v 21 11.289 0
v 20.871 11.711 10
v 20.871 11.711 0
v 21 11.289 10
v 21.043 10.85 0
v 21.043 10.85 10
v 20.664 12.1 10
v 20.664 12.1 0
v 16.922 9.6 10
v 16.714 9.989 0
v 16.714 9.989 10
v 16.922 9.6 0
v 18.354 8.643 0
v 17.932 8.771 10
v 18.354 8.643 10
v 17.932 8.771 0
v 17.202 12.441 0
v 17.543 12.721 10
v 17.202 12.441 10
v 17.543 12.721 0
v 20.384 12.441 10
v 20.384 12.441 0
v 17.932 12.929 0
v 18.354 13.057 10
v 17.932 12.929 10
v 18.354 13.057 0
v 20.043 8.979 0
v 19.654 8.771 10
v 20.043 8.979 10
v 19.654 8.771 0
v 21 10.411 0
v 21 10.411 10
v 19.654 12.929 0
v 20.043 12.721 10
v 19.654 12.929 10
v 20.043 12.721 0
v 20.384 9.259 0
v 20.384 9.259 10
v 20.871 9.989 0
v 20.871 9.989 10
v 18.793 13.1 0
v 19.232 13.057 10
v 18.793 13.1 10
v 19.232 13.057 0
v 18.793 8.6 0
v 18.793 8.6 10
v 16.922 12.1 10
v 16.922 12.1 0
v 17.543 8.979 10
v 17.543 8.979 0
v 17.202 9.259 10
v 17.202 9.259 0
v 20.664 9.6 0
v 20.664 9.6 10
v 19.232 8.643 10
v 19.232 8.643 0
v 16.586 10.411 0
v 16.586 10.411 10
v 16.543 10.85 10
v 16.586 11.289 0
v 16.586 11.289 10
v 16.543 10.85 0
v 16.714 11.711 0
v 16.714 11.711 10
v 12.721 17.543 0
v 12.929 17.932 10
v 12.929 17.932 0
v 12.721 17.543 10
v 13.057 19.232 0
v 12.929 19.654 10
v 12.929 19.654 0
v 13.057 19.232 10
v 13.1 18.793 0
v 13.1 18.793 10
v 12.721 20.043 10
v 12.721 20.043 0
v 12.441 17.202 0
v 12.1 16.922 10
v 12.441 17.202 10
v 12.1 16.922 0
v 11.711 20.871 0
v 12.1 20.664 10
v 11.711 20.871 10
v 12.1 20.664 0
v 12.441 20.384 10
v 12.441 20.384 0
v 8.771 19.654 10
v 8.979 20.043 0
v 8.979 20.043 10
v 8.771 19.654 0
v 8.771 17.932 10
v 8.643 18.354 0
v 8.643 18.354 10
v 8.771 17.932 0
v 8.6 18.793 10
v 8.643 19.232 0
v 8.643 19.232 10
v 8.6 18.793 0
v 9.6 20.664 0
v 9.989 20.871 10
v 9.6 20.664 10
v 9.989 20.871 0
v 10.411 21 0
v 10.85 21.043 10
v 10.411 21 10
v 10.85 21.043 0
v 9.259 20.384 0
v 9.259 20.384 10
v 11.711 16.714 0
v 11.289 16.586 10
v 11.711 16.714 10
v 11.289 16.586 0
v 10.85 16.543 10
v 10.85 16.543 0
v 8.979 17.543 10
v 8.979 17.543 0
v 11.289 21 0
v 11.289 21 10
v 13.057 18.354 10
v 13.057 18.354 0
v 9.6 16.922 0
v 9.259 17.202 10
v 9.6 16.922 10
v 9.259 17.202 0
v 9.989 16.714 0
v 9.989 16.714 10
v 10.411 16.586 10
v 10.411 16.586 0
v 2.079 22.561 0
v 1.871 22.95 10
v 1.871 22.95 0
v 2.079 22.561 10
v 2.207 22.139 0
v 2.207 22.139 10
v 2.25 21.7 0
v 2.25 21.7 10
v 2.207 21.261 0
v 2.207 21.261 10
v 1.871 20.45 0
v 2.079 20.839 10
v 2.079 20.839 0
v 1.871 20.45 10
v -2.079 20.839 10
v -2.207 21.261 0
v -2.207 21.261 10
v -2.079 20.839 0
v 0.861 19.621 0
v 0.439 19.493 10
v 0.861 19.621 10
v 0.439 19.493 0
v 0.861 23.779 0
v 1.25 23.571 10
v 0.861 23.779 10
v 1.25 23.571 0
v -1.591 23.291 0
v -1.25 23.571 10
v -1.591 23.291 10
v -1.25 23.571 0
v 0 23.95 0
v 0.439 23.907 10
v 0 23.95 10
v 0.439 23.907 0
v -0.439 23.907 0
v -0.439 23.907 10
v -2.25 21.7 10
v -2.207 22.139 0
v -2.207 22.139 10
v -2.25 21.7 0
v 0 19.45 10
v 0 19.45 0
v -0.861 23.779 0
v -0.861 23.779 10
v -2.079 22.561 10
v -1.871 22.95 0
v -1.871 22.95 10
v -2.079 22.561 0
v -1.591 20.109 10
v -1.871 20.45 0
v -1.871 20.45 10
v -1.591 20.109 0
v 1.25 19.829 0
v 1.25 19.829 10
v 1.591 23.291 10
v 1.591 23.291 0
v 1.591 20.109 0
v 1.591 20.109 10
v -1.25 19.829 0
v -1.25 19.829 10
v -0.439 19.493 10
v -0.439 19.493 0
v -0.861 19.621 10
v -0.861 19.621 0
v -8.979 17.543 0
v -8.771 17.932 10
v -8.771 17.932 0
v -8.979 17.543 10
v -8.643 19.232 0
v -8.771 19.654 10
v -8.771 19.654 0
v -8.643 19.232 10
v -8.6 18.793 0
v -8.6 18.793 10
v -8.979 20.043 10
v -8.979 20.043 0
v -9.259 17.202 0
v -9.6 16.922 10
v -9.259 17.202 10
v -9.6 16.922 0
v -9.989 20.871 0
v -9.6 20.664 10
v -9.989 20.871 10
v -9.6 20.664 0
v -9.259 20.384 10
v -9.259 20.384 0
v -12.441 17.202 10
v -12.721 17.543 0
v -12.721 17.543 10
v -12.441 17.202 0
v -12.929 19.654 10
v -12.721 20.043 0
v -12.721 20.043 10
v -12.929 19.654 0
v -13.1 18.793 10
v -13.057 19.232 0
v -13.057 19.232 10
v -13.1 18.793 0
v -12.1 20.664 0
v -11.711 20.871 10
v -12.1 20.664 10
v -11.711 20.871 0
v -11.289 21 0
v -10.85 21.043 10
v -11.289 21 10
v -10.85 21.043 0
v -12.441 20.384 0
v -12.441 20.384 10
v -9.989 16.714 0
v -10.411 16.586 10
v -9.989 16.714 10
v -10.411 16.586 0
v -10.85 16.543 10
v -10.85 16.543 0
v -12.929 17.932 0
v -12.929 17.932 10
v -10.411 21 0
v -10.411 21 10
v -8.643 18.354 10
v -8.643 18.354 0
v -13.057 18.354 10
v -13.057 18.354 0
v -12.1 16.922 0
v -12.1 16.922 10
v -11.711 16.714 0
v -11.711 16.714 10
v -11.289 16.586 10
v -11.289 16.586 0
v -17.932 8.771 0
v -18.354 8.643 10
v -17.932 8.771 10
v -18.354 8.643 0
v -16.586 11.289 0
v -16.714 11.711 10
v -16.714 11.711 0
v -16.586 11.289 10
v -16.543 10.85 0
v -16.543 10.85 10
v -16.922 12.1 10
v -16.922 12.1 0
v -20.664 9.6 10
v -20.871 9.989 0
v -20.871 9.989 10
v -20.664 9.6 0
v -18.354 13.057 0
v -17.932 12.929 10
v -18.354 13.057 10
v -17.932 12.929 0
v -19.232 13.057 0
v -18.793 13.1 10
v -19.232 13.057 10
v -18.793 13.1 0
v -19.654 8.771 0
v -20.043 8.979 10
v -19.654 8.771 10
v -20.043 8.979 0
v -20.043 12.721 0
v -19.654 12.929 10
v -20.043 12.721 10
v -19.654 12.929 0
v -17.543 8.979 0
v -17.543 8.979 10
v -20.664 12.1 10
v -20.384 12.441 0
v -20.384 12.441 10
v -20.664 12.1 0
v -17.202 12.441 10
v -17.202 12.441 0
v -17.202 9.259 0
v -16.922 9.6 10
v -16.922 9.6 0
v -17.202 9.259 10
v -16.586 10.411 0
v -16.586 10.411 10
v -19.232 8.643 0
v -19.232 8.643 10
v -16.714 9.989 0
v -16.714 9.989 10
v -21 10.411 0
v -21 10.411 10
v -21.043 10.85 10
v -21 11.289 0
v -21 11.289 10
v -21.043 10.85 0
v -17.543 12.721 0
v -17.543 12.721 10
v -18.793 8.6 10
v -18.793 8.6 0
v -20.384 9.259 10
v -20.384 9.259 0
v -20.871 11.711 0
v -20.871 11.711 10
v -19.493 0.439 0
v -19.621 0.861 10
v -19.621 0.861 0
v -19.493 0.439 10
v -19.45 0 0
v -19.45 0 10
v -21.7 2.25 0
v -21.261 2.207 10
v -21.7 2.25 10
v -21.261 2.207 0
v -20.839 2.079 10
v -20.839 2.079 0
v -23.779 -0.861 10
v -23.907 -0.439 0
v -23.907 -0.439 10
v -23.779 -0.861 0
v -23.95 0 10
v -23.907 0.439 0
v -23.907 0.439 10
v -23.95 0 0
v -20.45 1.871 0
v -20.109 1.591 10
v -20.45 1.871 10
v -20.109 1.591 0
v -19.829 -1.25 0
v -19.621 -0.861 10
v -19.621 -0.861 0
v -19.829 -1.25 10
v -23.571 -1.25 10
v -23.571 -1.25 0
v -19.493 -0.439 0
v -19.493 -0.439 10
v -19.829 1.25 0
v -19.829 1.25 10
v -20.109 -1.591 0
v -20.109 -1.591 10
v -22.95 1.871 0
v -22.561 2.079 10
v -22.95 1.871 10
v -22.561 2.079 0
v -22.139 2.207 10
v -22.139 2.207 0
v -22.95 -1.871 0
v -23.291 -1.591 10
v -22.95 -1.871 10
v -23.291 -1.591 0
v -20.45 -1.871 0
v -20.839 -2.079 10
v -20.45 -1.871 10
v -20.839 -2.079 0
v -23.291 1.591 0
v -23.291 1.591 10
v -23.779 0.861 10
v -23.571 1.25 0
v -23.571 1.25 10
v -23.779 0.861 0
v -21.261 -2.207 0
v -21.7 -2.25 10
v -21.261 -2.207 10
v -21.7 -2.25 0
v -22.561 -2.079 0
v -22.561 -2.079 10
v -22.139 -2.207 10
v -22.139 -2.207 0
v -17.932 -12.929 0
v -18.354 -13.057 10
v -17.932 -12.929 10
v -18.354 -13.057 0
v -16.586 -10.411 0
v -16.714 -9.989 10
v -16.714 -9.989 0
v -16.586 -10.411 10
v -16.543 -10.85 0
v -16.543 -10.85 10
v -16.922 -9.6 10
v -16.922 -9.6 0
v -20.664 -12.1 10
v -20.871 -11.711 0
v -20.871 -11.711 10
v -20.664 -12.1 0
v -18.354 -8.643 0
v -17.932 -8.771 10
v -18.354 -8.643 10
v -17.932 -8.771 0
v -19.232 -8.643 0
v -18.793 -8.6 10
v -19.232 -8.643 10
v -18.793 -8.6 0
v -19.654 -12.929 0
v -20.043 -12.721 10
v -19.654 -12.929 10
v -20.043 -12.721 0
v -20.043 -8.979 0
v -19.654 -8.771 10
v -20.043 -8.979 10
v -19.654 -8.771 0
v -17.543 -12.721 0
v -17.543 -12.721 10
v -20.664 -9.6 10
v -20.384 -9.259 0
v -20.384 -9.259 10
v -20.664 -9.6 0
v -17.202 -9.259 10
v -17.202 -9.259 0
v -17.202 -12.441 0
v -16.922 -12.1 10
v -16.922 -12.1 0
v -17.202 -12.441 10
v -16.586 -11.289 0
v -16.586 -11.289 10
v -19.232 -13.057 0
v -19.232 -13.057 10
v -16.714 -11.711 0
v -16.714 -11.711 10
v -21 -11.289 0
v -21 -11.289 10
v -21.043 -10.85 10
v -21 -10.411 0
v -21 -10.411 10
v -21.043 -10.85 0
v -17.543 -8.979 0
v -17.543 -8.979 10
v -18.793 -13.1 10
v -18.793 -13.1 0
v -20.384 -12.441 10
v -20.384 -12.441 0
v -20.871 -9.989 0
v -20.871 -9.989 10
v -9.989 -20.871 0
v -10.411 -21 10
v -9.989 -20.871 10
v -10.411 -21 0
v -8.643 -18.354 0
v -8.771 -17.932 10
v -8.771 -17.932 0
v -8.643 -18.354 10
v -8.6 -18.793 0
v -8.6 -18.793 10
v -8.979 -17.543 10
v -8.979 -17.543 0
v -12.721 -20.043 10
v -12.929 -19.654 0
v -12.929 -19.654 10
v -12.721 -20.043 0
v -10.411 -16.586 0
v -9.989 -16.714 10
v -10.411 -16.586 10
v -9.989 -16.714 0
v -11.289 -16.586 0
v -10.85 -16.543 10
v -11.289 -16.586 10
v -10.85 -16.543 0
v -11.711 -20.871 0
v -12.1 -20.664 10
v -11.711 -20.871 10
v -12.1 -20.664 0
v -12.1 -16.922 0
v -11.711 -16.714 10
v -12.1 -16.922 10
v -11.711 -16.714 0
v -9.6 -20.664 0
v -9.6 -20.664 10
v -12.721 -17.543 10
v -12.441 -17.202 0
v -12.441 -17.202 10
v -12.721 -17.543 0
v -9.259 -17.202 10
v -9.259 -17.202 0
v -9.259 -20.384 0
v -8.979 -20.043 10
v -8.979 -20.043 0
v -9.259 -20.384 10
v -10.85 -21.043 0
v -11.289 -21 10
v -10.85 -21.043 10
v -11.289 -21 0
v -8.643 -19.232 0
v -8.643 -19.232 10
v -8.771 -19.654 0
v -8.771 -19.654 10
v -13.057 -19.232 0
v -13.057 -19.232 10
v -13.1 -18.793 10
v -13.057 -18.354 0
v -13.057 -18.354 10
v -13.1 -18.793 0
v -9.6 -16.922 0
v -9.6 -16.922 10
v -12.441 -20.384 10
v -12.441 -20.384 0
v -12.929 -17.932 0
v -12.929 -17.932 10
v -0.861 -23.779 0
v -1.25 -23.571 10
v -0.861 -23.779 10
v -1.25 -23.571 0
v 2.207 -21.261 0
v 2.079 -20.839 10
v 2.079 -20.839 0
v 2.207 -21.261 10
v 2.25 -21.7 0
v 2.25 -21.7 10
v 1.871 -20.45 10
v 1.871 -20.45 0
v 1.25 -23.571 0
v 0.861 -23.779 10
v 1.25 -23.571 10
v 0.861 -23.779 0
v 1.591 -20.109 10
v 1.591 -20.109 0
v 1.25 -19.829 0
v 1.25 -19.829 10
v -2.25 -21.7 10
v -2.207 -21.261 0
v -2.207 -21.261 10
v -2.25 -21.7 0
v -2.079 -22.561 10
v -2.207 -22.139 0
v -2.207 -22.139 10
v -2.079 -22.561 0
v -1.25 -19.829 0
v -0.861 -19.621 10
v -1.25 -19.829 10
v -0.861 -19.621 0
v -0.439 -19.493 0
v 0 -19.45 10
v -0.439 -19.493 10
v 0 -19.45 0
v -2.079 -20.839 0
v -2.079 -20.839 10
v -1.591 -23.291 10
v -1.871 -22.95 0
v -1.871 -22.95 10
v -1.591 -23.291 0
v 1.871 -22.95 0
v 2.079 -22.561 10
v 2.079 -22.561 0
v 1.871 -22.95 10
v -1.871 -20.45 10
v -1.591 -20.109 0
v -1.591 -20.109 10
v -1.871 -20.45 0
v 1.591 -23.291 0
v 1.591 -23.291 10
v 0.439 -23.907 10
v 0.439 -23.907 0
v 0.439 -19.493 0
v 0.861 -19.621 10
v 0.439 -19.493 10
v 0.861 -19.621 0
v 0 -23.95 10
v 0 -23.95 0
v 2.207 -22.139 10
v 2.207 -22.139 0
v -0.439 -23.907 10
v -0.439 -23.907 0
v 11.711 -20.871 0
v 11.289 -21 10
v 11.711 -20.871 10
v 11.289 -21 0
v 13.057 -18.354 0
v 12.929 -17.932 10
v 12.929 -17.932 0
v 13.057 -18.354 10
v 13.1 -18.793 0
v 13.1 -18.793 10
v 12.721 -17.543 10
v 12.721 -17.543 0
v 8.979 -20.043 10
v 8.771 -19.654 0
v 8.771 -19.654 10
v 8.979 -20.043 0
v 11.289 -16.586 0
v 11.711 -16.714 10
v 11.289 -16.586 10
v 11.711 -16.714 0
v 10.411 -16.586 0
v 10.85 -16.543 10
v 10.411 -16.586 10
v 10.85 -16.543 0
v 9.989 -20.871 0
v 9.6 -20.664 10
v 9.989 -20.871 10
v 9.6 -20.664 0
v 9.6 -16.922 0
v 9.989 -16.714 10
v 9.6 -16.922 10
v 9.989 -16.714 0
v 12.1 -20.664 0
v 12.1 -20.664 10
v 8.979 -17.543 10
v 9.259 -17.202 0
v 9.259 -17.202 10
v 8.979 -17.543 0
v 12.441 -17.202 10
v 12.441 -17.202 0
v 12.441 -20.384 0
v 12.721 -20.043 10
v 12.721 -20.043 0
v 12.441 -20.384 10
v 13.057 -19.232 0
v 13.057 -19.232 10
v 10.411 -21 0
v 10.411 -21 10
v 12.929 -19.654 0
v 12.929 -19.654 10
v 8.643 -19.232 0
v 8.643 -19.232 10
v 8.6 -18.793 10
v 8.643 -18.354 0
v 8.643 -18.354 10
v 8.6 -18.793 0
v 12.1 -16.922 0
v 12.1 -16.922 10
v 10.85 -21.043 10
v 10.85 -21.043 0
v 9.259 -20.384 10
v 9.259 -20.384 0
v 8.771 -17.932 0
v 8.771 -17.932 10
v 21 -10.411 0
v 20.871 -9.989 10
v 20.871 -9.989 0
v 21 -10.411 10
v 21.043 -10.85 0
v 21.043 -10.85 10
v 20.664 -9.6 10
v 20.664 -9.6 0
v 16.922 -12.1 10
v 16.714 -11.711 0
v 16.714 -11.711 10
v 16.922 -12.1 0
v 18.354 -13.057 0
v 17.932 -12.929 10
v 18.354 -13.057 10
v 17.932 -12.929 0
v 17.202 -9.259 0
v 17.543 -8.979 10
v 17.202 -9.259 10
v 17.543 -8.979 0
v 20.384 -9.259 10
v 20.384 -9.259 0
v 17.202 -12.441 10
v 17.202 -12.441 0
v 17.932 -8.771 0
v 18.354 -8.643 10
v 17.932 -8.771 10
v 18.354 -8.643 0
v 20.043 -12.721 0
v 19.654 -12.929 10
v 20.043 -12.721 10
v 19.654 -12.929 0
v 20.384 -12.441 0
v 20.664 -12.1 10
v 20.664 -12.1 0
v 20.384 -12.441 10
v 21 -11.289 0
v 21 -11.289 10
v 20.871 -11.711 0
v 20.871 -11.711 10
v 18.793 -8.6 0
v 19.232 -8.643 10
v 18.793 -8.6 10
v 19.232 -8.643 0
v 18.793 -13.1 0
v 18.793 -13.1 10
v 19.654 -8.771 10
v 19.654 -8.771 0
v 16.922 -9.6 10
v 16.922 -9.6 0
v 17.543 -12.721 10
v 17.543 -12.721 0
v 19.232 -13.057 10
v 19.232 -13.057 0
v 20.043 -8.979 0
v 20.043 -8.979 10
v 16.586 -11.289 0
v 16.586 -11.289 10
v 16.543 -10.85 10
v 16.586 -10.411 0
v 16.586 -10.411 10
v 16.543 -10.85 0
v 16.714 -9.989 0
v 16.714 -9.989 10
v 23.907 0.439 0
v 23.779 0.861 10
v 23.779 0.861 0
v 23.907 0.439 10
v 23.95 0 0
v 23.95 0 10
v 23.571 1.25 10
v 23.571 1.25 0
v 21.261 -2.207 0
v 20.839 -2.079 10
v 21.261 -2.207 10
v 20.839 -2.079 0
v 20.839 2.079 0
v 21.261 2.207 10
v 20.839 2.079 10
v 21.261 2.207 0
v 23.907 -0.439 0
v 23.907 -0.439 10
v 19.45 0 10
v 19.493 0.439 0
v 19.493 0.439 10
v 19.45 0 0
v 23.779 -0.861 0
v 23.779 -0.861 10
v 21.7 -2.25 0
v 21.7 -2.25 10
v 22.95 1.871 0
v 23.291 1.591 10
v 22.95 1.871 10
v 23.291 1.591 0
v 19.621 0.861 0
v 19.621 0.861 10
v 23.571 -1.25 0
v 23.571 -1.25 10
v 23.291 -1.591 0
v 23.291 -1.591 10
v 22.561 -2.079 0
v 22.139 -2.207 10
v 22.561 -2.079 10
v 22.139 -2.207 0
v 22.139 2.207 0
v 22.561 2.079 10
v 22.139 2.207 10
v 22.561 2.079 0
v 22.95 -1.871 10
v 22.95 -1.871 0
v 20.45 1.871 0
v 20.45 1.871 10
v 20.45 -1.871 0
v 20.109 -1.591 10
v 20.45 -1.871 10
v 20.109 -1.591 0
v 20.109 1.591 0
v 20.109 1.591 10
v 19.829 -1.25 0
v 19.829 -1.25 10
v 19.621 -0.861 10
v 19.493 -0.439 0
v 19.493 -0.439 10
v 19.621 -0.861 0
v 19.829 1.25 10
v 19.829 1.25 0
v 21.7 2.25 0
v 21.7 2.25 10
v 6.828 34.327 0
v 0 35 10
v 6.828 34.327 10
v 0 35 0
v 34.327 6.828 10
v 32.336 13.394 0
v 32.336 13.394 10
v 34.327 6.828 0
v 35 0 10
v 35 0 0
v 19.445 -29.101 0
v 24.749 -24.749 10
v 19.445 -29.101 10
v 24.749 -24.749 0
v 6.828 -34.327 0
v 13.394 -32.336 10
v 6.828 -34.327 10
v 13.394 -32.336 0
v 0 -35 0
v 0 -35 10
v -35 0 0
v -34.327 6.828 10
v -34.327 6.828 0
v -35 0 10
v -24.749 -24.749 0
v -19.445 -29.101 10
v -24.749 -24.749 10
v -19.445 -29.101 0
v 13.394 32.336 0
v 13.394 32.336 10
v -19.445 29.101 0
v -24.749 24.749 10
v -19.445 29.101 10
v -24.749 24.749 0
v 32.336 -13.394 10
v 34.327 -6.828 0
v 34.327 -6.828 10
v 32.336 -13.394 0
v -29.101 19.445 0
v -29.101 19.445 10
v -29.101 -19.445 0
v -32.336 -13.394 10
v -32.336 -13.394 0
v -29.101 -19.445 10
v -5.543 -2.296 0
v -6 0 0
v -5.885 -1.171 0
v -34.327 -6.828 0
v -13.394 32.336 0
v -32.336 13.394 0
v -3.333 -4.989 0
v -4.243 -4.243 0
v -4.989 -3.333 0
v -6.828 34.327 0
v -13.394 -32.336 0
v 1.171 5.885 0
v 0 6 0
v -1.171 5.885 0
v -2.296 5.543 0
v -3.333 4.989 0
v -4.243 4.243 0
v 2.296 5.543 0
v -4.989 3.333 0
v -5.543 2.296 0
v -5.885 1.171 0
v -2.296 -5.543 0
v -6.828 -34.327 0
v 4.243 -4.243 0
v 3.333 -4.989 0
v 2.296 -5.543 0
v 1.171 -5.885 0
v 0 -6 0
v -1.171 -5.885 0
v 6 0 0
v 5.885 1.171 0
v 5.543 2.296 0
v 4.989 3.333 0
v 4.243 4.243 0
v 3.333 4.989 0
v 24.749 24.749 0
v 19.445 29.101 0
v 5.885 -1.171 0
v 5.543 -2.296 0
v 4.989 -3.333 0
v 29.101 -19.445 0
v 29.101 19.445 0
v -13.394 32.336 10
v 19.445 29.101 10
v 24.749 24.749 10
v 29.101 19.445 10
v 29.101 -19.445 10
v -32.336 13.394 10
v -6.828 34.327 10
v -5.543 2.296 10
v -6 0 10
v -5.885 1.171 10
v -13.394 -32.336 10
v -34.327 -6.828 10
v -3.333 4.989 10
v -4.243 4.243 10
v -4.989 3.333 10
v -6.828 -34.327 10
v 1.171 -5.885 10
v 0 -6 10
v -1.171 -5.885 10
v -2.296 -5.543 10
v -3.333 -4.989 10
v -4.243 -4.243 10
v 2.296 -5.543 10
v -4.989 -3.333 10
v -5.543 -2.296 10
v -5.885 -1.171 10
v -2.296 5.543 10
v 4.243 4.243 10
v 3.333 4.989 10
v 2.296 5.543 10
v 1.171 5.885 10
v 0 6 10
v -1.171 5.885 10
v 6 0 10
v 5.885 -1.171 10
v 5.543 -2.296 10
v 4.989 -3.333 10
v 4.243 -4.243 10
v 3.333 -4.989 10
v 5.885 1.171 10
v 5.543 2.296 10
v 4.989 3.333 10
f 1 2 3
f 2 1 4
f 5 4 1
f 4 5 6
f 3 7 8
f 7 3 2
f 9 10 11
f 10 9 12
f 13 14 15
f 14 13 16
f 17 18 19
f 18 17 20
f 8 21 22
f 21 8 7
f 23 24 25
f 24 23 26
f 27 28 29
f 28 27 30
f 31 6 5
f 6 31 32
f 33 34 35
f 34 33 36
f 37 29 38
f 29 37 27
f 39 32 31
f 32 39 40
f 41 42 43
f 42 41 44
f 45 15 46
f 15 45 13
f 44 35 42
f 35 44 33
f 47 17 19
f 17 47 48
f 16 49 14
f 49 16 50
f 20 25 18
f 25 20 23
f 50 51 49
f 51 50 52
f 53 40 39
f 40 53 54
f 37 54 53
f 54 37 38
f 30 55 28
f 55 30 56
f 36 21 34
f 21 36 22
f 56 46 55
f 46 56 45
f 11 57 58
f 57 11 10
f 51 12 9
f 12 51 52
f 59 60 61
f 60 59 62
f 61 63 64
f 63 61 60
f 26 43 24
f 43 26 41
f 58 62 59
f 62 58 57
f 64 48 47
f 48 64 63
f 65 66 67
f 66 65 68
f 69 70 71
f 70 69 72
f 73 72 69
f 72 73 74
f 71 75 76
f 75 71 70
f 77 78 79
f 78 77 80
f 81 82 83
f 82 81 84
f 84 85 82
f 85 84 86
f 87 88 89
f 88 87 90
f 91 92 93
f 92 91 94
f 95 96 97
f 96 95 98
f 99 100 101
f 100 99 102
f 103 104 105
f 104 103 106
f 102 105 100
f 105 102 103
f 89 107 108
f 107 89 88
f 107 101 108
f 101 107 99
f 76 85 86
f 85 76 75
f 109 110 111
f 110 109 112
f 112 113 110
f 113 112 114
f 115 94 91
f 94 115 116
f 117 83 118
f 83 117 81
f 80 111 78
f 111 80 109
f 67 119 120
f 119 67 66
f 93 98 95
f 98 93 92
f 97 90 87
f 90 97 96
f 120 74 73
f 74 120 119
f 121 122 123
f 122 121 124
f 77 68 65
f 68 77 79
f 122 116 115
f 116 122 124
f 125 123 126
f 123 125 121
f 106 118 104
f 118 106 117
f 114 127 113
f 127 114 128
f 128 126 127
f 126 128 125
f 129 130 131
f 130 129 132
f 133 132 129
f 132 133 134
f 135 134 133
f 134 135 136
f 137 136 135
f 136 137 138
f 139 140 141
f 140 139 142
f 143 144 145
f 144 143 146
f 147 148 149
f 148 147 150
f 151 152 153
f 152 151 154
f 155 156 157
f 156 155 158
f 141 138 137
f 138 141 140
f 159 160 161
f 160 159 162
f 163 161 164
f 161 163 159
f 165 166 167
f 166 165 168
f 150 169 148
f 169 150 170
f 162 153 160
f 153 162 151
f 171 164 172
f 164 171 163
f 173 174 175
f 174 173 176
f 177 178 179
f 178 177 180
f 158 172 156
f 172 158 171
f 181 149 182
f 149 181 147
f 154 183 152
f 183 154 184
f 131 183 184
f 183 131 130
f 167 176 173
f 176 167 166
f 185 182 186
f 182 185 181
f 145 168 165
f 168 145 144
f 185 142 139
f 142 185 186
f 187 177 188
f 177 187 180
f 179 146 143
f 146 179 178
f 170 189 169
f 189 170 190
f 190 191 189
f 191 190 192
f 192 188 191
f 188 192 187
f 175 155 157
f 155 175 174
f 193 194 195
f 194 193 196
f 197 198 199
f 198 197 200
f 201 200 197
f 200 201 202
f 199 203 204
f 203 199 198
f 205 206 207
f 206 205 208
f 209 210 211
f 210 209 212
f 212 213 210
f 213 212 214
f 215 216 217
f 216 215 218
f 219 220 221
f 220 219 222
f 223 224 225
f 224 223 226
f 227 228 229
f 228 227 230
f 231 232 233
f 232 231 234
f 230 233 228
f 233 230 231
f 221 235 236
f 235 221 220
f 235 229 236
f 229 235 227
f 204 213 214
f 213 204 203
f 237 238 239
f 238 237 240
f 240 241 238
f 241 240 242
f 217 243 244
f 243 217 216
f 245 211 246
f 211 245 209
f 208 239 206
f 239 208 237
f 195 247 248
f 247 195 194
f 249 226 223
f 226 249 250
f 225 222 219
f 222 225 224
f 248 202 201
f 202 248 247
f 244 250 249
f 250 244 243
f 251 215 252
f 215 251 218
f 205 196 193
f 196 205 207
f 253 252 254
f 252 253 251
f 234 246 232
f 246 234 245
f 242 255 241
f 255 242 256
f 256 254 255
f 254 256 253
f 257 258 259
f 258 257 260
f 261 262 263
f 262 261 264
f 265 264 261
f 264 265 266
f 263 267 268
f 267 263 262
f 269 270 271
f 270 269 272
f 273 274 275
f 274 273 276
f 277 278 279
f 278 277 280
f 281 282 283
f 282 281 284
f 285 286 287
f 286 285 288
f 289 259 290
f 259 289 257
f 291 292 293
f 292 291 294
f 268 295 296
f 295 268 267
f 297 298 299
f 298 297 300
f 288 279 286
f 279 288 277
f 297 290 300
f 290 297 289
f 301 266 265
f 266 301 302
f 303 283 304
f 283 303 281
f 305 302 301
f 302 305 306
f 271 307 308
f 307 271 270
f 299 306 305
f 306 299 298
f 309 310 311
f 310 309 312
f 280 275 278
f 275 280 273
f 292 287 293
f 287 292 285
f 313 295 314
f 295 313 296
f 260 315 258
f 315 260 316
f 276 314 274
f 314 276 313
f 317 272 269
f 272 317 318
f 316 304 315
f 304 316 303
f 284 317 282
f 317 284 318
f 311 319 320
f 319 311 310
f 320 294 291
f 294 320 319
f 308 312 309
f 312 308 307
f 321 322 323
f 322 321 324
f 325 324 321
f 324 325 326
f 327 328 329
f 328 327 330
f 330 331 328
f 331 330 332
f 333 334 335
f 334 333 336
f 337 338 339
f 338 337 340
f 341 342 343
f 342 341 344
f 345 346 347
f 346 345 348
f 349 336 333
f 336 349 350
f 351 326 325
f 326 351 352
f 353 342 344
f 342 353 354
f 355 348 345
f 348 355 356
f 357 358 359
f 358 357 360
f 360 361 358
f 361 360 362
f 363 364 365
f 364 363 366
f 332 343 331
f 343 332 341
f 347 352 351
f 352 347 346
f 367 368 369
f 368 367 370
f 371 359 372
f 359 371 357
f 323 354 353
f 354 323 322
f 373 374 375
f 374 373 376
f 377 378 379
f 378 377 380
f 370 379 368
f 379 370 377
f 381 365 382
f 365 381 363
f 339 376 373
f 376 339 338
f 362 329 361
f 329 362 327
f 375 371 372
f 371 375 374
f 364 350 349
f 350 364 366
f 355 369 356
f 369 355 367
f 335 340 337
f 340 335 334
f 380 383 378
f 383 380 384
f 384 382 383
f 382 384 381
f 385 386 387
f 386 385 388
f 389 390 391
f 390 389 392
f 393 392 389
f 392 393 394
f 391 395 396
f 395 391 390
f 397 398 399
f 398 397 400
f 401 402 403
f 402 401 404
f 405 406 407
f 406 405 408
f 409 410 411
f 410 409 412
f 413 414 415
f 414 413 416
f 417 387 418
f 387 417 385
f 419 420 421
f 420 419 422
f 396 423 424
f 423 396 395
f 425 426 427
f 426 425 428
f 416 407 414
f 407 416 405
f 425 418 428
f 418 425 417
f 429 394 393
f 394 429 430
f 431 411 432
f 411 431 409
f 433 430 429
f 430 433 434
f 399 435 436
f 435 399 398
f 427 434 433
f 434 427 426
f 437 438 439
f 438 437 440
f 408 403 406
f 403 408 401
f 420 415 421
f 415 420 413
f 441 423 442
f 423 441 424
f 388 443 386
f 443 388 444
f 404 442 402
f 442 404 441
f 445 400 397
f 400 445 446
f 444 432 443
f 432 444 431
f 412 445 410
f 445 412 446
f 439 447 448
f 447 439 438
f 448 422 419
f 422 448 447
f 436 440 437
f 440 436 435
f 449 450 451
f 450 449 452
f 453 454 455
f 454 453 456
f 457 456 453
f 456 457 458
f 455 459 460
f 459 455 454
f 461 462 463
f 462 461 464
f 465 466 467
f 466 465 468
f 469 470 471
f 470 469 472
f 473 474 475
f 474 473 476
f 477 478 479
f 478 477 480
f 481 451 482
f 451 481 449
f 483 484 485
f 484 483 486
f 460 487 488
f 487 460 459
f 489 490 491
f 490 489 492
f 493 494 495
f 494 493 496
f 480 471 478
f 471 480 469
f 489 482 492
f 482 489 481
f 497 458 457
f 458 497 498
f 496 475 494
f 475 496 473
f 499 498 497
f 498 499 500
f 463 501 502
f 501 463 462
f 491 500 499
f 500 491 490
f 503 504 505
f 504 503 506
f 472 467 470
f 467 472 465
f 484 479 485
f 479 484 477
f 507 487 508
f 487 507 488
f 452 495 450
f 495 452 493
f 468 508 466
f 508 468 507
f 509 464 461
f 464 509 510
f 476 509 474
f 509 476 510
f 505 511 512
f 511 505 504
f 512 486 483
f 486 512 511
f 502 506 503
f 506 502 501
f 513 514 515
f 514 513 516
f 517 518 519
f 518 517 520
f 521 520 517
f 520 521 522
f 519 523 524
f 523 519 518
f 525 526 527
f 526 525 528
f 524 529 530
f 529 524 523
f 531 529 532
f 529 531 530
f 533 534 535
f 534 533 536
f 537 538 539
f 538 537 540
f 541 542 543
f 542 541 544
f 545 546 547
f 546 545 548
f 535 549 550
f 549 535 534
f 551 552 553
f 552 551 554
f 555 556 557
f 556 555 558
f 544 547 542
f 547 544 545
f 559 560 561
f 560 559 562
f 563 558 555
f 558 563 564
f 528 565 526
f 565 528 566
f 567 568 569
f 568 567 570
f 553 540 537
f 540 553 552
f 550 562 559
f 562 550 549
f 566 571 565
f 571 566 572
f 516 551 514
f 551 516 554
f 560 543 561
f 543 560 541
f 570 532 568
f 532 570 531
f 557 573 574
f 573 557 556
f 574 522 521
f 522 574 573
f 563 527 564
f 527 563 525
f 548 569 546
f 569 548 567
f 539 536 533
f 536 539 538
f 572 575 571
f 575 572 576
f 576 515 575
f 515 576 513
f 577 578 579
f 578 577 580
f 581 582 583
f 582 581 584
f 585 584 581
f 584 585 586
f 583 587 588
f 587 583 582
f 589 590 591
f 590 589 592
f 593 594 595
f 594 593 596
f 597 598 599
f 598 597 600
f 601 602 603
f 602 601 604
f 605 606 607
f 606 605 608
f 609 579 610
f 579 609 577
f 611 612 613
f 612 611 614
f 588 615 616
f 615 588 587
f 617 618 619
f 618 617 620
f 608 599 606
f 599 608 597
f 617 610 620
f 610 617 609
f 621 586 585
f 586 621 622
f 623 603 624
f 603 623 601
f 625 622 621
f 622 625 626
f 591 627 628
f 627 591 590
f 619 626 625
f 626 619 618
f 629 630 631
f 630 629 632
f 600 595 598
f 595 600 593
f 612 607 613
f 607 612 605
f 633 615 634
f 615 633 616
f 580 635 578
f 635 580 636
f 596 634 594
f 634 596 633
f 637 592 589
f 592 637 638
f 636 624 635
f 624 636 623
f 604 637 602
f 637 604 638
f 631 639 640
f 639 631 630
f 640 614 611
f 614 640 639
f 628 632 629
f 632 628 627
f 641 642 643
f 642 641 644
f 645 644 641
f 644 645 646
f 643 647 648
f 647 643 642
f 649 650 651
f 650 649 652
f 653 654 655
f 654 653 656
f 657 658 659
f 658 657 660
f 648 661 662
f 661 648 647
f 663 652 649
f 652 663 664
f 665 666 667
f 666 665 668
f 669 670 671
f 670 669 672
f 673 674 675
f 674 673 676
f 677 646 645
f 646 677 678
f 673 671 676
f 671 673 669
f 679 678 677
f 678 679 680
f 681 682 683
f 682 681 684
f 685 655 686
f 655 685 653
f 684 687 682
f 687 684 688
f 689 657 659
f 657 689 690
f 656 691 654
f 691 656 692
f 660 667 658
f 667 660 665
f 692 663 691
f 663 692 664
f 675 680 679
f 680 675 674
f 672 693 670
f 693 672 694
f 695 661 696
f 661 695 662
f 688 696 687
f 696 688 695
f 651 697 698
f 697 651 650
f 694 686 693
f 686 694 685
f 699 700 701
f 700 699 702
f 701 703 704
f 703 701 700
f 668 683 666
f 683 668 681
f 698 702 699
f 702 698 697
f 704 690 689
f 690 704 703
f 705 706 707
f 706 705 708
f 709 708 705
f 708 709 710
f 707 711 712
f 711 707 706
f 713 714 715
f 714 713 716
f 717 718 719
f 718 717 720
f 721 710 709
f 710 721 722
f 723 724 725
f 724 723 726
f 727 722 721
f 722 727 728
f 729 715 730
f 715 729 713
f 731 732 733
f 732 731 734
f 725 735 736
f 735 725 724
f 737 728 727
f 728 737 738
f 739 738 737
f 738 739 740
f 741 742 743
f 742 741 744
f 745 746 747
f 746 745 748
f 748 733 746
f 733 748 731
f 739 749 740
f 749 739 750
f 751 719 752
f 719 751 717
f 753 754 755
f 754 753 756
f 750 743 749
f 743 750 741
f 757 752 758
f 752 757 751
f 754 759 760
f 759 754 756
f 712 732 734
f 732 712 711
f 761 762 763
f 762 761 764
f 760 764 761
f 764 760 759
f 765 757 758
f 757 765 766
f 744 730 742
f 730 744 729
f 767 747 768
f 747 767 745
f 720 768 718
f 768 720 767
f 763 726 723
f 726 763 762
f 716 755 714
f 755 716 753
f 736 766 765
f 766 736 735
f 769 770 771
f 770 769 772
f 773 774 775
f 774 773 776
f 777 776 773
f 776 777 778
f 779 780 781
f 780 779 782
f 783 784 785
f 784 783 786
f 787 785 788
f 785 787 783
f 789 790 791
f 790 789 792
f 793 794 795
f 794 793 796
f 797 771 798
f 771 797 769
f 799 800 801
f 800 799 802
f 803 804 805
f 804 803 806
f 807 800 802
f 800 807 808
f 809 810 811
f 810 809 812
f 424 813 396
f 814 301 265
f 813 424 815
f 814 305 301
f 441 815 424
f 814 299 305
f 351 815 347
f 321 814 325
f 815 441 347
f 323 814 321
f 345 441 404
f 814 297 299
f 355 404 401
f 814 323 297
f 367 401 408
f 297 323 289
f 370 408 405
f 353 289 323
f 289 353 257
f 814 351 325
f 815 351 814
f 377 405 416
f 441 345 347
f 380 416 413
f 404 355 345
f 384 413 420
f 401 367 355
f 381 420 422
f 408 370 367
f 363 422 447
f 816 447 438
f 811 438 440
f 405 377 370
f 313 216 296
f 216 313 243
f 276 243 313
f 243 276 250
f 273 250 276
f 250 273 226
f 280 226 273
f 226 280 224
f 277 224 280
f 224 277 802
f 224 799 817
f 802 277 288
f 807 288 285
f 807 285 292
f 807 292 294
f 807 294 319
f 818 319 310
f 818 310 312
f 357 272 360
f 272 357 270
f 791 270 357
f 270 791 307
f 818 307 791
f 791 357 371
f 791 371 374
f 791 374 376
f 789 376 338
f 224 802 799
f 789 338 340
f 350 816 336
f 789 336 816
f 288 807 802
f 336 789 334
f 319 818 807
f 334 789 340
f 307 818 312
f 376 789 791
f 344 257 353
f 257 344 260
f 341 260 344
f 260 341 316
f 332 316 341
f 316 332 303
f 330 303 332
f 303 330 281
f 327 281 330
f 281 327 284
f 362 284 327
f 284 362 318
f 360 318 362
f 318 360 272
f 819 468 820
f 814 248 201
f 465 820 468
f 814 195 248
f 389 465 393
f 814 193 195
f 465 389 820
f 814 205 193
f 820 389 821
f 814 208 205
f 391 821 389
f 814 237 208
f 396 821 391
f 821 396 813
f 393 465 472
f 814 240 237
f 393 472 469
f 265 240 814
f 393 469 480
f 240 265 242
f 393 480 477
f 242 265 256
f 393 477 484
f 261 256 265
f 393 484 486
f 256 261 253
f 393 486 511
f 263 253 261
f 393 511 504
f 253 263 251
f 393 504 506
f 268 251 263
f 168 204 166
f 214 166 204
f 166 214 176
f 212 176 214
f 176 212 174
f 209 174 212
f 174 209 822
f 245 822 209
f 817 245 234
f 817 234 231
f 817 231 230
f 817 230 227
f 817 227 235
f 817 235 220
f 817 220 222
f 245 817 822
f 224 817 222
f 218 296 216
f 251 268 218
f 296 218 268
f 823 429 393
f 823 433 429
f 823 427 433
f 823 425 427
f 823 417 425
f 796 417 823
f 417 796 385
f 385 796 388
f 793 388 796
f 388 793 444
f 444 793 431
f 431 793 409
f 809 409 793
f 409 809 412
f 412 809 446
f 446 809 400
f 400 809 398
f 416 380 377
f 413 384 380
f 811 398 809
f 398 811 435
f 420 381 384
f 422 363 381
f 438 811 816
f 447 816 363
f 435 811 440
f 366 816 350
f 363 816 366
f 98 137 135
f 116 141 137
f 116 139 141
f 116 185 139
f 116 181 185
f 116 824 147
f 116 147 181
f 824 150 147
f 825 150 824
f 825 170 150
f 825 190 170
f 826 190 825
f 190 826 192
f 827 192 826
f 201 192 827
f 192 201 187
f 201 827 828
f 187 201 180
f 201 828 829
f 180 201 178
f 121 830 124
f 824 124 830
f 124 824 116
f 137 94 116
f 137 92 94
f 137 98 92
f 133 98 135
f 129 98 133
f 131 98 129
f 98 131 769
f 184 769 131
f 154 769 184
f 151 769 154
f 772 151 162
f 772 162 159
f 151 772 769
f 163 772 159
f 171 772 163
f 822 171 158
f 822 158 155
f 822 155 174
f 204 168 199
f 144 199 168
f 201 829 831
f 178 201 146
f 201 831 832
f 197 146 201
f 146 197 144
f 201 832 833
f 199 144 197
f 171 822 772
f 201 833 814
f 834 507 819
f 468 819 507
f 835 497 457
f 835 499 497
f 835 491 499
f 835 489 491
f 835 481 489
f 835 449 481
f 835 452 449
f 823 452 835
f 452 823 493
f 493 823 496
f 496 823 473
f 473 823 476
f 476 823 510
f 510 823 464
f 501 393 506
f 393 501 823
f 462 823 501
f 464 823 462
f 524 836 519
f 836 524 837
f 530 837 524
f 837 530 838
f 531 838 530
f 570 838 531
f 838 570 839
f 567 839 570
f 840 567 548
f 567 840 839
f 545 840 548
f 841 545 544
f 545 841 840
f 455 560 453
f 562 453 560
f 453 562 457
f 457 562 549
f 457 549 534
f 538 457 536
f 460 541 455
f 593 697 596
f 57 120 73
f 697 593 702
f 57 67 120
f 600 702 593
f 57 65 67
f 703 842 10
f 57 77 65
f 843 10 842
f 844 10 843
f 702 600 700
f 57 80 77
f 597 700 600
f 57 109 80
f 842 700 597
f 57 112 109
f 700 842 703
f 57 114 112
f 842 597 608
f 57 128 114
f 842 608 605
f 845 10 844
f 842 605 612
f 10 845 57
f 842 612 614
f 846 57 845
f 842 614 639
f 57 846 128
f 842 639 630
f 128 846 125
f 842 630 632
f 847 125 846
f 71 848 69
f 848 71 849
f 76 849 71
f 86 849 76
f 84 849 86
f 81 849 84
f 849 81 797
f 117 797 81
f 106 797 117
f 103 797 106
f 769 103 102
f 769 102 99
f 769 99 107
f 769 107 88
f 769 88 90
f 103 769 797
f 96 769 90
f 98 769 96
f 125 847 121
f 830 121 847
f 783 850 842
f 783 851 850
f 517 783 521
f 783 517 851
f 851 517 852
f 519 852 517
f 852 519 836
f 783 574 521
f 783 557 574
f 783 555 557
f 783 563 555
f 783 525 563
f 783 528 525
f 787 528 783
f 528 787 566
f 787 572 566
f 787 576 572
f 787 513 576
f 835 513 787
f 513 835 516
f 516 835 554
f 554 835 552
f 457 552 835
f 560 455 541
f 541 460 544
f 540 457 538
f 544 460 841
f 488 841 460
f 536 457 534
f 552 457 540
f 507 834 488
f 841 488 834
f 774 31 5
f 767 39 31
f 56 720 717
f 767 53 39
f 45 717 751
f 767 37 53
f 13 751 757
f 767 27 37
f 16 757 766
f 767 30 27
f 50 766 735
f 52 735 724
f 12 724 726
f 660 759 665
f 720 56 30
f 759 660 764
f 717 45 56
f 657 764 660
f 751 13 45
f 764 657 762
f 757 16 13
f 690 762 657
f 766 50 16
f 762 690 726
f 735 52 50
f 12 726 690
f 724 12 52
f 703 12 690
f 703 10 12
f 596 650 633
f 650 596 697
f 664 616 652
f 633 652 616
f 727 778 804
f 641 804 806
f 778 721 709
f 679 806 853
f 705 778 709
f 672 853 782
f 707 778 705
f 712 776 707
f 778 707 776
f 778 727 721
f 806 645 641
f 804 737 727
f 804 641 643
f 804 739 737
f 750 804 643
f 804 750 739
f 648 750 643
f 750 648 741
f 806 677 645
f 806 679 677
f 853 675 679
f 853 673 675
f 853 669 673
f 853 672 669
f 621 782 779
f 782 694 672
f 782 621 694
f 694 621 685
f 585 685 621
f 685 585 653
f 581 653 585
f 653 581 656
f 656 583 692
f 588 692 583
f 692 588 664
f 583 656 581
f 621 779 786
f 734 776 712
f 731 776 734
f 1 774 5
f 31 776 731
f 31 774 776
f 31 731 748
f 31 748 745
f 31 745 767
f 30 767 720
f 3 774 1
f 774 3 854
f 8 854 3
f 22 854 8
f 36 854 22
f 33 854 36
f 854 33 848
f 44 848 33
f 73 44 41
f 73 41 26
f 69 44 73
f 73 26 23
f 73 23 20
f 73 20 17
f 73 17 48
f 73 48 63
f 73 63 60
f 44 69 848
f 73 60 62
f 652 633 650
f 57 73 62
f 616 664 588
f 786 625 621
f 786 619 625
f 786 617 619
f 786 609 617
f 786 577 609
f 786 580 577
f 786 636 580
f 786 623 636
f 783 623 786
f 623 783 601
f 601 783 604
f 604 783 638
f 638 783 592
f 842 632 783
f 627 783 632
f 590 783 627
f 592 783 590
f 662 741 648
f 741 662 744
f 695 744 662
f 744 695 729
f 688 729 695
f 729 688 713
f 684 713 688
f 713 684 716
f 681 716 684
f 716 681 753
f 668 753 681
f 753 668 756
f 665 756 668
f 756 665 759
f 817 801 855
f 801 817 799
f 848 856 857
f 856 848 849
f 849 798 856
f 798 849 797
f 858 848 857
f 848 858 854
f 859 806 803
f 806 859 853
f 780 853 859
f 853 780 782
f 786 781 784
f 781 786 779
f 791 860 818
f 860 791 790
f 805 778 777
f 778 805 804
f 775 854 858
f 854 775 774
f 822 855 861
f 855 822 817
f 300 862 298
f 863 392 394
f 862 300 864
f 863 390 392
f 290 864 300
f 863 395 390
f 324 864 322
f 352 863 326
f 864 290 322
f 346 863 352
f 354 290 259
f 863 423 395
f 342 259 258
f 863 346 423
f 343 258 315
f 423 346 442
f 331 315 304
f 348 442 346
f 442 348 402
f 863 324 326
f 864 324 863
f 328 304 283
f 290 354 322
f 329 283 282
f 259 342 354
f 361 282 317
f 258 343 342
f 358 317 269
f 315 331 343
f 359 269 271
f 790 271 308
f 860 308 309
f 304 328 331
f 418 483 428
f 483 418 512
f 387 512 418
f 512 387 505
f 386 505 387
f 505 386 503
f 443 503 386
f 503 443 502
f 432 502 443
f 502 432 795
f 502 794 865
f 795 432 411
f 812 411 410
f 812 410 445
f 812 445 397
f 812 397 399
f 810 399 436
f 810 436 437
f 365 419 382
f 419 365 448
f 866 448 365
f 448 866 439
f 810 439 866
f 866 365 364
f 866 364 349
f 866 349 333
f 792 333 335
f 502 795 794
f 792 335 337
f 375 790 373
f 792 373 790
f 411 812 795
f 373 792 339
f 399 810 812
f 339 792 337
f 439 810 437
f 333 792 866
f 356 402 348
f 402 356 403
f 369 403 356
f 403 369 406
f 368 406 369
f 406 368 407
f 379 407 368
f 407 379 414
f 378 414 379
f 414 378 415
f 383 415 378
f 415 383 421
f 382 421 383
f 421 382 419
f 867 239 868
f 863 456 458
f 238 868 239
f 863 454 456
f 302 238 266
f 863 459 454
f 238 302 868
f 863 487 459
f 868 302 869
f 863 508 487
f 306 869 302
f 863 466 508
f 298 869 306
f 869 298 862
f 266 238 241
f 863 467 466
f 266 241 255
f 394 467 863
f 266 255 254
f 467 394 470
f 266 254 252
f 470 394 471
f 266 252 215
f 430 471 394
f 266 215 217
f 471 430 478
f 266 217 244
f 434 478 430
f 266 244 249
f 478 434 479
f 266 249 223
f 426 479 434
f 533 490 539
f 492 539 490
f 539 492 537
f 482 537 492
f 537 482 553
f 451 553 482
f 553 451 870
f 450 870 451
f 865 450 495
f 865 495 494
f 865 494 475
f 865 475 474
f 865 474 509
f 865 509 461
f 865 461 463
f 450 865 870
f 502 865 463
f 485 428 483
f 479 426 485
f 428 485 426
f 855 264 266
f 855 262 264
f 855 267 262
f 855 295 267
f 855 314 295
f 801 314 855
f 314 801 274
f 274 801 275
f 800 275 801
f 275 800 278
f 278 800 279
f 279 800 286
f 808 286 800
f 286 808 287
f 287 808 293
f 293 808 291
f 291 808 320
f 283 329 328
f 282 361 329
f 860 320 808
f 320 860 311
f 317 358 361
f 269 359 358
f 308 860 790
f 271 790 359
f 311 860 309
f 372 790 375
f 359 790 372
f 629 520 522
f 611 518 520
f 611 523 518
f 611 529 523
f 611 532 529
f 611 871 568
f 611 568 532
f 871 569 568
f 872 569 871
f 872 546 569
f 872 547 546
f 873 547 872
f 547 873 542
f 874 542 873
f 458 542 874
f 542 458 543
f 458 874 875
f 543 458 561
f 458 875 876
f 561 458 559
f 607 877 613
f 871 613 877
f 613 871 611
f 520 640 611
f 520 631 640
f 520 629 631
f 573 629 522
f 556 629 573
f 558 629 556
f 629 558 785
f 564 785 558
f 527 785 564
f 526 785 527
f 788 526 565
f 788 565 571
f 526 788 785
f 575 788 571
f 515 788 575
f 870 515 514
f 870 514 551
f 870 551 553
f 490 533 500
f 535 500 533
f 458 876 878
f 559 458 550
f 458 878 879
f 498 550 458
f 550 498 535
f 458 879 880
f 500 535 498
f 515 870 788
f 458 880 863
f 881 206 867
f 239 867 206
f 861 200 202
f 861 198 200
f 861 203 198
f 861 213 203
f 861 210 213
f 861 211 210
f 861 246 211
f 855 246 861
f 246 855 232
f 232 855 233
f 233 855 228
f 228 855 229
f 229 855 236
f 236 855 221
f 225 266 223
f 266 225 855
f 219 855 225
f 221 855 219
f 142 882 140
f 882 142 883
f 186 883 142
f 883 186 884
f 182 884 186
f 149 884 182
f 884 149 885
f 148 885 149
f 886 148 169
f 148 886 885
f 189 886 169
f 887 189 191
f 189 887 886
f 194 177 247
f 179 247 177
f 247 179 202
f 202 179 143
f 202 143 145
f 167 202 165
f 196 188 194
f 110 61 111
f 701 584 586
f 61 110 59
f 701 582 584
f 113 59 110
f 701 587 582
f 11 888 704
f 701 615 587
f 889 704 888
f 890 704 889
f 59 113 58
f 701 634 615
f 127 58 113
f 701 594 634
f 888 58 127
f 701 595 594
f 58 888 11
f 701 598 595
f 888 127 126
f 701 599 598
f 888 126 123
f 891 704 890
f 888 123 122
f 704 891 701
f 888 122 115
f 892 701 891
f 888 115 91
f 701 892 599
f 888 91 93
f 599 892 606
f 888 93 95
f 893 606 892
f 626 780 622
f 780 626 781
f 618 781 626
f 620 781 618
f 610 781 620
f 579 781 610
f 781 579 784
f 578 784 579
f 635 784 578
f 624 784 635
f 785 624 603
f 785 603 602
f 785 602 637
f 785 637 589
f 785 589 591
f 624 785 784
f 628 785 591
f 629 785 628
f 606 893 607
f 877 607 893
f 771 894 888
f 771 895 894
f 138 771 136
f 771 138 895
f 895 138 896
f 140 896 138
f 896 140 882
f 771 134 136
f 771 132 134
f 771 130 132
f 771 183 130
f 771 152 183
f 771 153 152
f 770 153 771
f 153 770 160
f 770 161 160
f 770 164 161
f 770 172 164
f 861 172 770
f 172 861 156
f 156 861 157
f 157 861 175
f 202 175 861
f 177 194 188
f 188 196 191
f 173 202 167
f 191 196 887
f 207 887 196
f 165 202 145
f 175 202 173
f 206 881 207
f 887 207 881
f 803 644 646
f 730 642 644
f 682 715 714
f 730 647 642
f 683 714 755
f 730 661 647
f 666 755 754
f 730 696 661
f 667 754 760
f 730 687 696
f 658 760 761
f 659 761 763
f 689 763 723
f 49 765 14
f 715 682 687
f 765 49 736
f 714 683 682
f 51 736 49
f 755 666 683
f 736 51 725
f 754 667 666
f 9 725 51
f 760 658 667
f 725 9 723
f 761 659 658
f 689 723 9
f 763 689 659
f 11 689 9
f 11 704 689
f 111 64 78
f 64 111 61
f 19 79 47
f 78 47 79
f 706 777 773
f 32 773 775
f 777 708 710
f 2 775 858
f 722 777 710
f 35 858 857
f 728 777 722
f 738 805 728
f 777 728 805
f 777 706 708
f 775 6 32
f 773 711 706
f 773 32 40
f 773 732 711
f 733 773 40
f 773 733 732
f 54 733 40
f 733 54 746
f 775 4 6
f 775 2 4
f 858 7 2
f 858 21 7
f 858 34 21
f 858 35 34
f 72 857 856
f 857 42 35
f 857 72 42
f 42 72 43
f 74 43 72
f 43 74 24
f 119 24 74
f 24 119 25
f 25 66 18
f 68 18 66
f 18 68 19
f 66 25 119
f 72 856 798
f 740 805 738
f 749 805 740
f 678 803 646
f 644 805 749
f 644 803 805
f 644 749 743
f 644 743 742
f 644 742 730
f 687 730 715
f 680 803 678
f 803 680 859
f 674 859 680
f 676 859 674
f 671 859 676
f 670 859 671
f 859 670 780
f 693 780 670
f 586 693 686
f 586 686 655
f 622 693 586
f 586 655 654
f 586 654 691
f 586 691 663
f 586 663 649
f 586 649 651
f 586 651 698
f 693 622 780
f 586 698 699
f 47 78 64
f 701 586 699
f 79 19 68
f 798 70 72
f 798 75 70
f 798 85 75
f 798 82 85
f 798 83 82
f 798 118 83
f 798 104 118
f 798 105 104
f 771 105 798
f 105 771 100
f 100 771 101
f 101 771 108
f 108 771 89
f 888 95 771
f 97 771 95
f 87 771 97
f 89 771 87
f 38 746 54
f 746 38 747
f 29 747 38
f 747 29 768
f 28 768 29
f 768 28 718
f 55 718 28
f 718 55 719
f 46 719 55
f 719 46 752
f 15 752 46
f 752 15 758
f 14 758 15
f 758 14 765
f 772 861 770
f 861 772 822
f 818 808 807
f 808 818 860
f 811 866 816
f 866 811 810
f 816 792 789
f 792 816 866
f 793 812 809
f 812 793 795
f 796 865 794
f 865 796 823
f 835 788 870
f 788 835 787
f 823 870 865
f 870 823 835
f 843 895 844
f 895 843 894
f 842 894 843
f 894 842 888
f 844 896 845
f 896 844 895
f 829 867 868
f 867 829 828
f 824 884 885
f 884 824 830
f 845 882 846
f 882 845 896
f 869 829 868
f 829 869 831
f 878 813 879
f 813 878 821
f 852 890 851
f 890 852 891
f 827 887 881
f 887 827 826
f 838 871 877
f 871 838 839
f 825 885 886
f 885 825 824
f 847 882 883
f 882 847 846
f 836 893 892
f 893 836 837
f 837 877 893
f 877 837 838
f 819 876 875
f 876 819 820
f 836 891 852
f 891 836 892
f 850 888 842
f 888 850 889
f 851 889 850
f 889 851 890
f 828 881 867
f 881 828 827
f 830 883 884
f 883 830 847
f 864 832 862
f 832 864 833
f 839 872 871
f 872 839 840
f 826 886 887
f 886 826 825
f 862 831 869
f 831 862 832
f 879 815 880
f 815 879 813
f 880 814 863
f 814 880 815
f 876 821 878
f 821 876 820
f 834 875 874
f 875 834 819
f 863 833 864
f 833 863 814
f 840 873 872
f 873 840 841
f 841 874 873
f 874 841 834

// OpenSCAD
$fn = 32;

// ----------------------------------------------------------------------
// Flange Ø70 x 10
// 12 holes on a Ø43.4 bolt circle, bolted joints
// ----------------------------------------------------------------------

// --- parameters (mm) ---
flange_d = 70;   // outside diameter of the flange
thickness = 10;  // flange thickness
holes = 12;      // number of bolt holes
pcd = 43.4;      // bolt circle diameter
start_deg = 30;  // angle of the first hole, from +X
hole_d = 4.5;    // bolt hole diameter
bore_d = 12;     // central through bore
hub_d = 24;      // hub outside diameter
hub_h = 0;       // hub height above the flange face (0 = no hub)

// --- derived feature positions (mm) ---
height = thickness + hub_h;  // = 10   overall height of the part
pcd_r = pcd / 2;             // = 21.7   bolt circle radius
hole_step = 360 / holes;     // = 30   angular pitch
feature_centers = [
  [pcd_r * cos(start_deg + 0 * hole_step), pcd_r * sin(start_deg + 0 * hole_step)],
  [pcd_r * cos(start_deg + 1 * hole_step), pcd_r * sin(start_deg + 1 * hole_step)],
  [pcd_r * cos(start_deg + 2 * hole_step), pcd_r * sin(start_deg + 2 * hole_step)],
  [pcd_r * cos(start_deg + 3 * hole_step), pcd_r * sin(start_deg + 3 * hole_step)],
  [pcd_r * cos(start_deg + 4 * hole_step), pcd_r * sin(start_deg + 4 * hole_step)],
  [pcd_r * cos(start_deg + 5 * hole_step), pcd_r * sin(start_deg + 5 * hole_step)],
  [pcd_r * cos(start_deg + 6 * hole_step), pcd_r * sin(start_deg + 6 * hole_step)],
  [pcd_r * cos(start_deg + 7 * hole_step), pcd_r * sin(start_deg + 7 * hole_step)],
  [pcd_r * cos(start_deg + 8 * hole_step), pcd_r * sin(start_deg + 8 * hole_step)],
  [pcd_r * cos(start_deg + 9 * hole_step), pcd_r * sin(start_deg + 9 * hole_step)],
  [pcd_r * cos(start_deg + 10 * hole_step), pcd_r * sin(start_deg + 10 * hole_step)],
  [pcd_r * cos(start_deg + 11 * hole_step), pcd_r * sin(start_deg + 11 * hole_step)]
];   // bolt hole centres on the pitch circle

// flange disc, every hole and the bore cut straight through
difference() {
  union() {
    cylinder(d = flange_d, h = thickness);
  }
  translate([0, 0, -1]) cylinder(d = bore_d, h = height + 2);  // bore, through
  for (centre = feature_centers)
    translate([centre[0], centre[1], -1]) cylinder(d = hole_d, h = thickness + 2);
}
